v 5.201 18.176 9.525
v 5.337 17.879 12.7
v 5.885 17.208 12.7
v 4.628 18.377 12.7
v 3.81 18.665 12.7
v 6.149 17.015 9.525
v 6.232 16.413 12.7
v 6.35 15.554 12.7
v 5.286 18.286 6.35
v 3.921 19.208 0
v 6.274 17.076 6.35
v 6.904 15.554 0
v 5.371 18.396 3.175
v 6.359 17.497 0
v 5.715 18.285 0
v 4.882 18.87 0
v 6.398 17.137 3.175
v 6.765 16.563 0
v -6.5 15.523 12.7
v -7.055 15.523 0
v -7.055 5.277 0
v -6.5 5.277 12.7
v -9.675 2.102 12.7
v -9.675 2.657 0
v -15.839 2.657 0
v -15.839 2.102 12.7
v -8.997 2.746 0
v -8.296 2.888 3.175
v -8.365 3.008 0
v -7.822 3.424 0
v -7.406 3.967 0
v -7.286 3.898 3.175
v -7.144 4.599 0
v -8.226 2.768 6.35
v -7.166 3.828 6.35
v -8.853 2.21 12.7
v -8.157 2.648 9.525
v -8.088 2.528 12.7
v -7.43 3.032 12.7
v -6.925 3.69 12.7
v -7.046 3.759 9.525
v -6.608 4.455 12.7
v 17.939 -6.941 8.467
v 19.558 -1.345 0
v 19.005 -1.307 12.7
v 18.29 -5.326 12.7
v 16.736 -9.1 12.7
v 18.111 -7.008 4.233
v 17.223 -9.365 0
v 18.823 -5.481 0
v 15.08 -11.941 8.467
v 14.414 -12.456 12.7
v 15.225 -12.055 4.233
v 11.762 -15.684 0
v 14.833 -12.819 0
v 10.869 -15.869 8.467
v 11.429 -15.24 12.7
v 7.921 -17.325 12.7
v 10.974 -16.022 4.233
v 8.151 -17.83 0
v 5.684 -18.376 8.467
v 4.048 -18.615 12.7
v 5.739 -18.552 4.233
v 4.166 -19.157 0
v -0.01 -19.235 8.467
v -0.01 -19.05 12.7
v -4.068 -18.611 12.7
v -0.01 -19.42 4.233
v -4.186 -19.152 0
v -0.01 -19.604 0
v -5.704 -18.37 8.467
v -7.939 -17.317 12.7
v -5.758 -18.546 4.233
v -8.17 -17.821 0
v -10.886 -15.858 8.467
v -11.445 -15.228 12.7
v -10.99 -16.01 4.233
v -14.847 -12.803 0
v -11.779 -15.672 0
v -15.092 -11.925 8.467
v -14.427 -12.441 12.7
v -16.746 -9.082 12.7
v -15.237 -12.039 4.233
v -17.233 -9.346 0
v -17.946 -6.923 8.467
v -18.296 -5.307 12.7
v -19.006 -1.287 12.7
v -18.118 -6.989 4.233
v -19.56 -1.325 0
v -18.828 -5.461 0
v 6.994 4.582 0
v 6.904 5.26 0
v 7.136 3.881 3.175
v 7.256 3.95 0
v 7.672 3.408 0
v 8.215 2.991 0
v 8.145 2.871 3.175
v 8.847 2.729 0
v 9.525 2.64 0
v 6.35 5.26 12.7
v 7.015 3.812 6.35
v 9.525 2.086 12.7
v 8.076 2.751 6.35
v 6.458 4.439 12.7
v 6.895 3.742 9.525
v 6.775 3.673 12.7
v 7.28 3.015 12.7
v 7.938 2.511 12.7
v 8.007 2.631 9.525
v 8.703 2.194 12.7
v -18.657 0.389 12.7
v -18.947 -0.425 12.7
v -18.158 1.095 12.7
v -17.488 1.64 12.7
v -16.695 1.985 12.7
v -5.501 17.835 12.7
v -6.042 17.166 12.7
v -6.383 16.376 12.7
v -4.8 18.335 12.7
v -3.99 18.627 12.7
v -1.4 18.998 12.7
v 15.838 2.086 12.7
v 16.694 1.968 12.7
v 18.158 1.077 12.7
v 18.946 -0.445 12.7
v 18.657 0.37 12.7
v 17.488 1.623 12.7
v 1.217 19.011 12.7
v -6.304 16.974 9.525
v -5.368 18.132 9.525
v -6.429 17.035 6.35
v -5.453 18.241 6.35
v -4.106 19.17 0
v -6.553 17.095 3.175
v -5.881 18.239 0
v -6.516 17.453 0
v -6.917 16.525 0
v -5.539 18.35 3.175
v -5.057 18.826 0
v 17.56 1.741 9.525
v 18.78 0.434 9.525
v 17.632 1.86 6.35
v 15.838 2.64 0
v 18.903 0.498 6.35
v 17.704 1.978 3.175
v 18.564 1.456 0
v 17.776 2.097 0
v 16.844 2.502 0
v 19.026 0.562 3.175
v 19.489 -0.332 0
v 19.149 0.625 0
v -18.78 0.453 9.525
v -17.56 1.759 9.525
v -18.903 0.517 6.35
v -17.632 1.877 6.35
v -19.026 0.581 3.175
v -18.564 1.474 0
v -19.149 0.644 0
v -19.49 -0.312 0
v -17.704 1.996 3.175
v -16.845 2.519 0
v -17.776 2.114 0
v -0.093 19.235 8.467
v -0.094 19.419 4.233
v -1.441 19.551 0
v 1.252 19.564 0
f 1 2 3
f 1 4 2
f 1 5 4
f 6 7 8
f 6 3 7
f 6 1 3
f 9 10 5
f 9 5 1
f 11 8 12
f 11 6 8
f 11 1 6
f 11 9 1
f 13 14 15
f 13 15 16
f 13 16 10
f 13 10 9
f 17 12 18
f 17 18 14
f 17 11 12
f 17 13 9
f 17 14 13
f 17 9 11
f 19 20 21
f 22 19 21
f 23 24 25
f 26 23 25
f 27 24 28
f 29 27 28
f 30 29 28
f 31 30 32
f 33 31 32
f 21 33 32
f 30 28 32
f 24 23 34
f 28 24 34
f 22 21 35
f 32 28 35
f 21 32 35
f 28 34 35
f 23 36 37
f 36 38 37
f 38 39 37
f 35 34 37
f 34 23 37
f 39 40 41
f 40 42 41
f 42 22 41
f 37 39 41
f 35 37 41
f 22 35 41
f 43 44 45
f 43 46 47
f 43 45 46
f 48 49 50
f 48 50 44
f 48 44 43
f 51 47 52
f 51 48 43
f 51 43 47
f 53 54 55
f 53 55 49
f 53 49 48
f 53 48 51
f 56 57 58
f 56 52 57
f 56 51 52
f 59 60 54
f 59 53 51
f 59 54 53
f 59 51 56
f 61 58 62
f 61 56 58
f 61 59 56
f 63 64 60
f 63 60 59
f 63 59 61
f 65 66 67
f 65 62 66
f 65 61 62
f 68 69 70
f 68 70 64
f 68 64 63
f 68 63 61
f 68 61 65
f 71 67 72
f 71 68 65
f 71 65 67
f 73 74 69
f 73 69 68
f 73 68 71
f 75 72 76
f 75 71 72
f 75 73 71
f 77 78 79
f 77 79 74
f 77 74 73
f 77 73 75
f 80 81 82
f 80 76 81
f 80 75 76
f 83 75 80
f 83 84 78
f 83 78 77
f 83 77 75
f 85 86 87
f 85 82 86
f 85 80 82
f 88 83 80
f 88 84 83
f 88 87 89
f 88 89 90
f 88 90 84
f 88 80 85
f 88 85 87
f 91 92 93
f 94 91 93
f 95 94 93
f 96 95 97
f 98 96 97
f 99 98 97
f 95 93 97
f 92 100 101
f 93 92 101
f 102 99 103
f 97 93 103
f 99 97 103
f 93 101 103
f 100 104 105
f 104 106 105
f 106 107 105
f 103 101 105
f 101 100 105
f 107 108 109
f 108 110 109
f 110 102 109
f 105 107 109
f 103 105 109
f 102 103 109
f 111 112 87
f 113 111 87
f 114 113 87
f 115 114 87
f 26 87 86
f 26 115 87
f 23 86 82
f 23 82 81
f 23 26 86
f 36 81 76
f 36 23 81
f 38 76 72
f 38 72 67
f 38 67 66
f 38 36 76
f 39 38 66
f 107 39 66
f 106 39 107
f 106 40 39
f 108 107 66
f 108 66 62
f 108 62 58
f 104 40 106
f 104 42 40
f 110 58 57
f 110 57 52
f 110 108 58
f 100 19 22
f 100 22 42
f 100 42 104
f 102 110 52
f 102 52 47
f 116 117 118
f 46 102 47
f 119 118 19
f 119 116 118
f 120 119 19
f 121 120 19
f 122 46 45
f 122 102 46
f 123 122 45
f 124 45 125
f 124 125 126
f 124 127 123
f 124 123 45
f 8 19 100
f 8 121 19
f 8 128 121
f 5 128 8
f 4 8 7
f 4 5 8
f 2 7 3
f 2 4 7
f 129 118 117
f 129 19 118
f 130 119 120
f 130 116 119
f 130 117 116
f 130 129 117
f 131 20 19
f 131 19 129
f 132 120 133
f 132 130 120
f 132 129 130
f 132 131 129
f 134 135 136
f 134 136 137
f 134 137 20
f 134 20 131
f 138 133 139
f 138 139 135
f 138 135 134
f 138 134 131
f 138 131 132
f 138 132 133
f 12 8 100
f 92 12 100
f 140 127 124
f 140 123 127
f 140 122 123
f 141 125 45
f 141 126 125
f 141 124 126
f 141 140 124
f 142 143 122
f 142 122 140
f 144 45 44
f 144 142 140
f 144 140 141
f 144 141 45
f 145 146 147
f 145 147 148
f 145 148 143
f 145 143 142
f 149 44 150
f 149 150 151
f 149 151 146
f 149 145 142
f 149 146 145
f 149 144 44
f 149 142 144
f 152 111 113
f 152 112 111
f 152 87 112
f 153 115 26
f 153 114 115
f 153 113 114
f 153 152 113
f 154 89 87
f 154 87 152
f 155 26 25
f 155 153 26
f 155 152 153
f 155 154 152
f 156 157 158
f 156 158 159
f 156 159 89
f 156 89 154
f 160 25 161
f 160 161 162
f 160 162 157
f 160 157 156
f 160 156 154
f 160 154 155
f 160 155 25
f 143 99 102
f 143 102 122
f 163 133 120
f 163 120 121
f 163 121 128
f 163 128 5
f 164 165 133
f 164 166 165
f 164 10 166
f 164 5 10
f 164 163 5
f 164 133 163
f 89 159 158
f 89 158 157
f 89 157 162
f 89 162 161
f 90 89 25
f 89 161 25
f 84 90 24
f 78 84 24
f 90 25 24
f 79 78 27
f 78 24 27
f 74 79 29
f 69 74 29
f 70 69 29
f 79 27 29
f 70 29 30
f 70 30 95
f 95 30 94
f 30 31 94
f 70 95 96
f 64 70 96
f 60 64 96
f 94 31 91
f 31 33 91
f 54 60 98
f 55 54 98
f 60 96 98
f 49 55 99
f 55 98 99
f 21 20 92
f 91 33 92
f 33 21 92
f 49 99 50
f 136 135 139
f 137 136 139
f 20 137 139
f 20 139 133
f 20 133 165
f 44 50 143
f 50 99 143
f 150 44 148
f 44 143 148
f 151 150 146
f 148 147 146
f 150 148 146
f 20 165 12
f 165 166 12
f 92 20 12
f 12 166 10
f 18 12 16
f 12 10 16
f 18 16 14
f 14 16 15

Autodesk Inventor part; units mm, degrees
ref_plane "YZ Plane" through (0, 0, 0) normal (1, 0, 0) x (0, 1, 0)
ref_plane "XZ Plane" through (0, 0, 0) normal (0, 1, 0) x (-1, 0, 0)
ref_plane "XY Plane" through (0, 0, 0) normal (0, 0, 1) x (1, 0, 0)
sketch "Sketch1" plane through (0, 0, 0) normal (0, 0, 1) x (1, 0, 0)
  circle A0 centre (0, 12.7) radius 3.175
  circle A1 centre (-0.0751, 0) radius 3.175
  line L0 (-0.0751, 0) -> (-0.0751, 19.0499)
  line L1 (-0.0751, 3.175) -> (-0.0751, 24.8386)
  line L2 (6.35, 15.5543) -> (6.35, 5.2605)
  line L3 (9.525, 2.0855) -> (15.8376, 2.0855)
  line L4 (-6.5001, 15.5229) -> (-6.5001, 5.2772)
  line L5 (-9.6751, 2.1022) -> (-15.8387, 2.1022)
  arc A2 (-19.0064, -1.2874) -> (19.0051, -1.3074) centre (0, 0) ccw
  arc A3 (3.81, 18.6651) -> (-3.9901, 18.6274) centre (0, 0) ccw
  arc A4 (-3.9901, 18.6274) -> (-6.5001, 15.5229) centre (-3.3251, 15.5229) ccw
  arc A5 (6.35, 15.5543) -> (3.81, 18.6651) centre (3.175, 15.5543) ccw
  arc A6 (6.35, 5.2605) -> (9.525, 2.0855) centre (9.525, 5.2605) ccw
  arc A7 (-9.6751, 2.1022) -> (-6.5001, 5.2772) centre (-9.6751, 5.2772) ccw
  arc A8 (-15.8387, 2.1022) -> (-19.0064, -1.2874) centre (-15.8387, -1.0728) ccw
  arc A9 (19.0051, -1.3074) -> (15.8376, 2.0855) centre (15.8376, -1.0895) ccw
  point P0 (6.35, 17.9605)
  point P1 (6.35, 2.0855)
  point P2 (18.9355, 2.0855)
  point P3 (-6.5001, 2.1022)
  point P4 (-18.9337, 2.1022)
  point P5 (-6.5001, 17.9067)
  dimension "d6" = 6.35
  dimension "d3" = 6.35
  dimension "d11" = 15.875
  dimension "d12" = 3.175
extrude "Extrusion1" add sketch "Sketch1" along normal blind 12.7 contours A0 L0 | L0 A0 | A1 | L2 A6 L3 A9 A2 A8 L5 A7 L4 A4 A3 A5
draft "FaceDraft1" angle 2.5 pull direction (0, 0, 1) faces at (6.35, 8.6918, 4.2333) (4.713, 18.3319, 8.4667) (6.5695, 4.1006, 8.4667) (2.9511, 18.82, 4.2333) (13.7334, 2.0855, 4.2333) (-6.0664, 17.1247, 8.4667) (16.3313, 2.0469, 8.4667) (-6.5001, 12.1076, 4.2333) (18.5791, -4.2093, 8.4667) (-7.8866, 2.6539, 8.4667) (-16.0862, 2.0925, 4.2333) (-11.7296, 2.1022, 4.2333) fixed edges at (6.35, 10.4074, 12.7) (5.6343, 17.5623, 12.7) (7.2799, 3.0154, 12.7) (-0.092, 19.0498, 12.7) (12.6813, 2.0855, 12.7) (-5.7941, 17.519, 12.7) (18.1584, 1.0772, 12.7) (-6.5001, 10.4, 12.7) (-0.01, -19.05, 12.7) (-7.43, 3.0321, 12.7) (-18.1584, 1.0951, 12.7) (-12.7569, 2.1022, 12.7)
properties part number "Crank Cast Image"
